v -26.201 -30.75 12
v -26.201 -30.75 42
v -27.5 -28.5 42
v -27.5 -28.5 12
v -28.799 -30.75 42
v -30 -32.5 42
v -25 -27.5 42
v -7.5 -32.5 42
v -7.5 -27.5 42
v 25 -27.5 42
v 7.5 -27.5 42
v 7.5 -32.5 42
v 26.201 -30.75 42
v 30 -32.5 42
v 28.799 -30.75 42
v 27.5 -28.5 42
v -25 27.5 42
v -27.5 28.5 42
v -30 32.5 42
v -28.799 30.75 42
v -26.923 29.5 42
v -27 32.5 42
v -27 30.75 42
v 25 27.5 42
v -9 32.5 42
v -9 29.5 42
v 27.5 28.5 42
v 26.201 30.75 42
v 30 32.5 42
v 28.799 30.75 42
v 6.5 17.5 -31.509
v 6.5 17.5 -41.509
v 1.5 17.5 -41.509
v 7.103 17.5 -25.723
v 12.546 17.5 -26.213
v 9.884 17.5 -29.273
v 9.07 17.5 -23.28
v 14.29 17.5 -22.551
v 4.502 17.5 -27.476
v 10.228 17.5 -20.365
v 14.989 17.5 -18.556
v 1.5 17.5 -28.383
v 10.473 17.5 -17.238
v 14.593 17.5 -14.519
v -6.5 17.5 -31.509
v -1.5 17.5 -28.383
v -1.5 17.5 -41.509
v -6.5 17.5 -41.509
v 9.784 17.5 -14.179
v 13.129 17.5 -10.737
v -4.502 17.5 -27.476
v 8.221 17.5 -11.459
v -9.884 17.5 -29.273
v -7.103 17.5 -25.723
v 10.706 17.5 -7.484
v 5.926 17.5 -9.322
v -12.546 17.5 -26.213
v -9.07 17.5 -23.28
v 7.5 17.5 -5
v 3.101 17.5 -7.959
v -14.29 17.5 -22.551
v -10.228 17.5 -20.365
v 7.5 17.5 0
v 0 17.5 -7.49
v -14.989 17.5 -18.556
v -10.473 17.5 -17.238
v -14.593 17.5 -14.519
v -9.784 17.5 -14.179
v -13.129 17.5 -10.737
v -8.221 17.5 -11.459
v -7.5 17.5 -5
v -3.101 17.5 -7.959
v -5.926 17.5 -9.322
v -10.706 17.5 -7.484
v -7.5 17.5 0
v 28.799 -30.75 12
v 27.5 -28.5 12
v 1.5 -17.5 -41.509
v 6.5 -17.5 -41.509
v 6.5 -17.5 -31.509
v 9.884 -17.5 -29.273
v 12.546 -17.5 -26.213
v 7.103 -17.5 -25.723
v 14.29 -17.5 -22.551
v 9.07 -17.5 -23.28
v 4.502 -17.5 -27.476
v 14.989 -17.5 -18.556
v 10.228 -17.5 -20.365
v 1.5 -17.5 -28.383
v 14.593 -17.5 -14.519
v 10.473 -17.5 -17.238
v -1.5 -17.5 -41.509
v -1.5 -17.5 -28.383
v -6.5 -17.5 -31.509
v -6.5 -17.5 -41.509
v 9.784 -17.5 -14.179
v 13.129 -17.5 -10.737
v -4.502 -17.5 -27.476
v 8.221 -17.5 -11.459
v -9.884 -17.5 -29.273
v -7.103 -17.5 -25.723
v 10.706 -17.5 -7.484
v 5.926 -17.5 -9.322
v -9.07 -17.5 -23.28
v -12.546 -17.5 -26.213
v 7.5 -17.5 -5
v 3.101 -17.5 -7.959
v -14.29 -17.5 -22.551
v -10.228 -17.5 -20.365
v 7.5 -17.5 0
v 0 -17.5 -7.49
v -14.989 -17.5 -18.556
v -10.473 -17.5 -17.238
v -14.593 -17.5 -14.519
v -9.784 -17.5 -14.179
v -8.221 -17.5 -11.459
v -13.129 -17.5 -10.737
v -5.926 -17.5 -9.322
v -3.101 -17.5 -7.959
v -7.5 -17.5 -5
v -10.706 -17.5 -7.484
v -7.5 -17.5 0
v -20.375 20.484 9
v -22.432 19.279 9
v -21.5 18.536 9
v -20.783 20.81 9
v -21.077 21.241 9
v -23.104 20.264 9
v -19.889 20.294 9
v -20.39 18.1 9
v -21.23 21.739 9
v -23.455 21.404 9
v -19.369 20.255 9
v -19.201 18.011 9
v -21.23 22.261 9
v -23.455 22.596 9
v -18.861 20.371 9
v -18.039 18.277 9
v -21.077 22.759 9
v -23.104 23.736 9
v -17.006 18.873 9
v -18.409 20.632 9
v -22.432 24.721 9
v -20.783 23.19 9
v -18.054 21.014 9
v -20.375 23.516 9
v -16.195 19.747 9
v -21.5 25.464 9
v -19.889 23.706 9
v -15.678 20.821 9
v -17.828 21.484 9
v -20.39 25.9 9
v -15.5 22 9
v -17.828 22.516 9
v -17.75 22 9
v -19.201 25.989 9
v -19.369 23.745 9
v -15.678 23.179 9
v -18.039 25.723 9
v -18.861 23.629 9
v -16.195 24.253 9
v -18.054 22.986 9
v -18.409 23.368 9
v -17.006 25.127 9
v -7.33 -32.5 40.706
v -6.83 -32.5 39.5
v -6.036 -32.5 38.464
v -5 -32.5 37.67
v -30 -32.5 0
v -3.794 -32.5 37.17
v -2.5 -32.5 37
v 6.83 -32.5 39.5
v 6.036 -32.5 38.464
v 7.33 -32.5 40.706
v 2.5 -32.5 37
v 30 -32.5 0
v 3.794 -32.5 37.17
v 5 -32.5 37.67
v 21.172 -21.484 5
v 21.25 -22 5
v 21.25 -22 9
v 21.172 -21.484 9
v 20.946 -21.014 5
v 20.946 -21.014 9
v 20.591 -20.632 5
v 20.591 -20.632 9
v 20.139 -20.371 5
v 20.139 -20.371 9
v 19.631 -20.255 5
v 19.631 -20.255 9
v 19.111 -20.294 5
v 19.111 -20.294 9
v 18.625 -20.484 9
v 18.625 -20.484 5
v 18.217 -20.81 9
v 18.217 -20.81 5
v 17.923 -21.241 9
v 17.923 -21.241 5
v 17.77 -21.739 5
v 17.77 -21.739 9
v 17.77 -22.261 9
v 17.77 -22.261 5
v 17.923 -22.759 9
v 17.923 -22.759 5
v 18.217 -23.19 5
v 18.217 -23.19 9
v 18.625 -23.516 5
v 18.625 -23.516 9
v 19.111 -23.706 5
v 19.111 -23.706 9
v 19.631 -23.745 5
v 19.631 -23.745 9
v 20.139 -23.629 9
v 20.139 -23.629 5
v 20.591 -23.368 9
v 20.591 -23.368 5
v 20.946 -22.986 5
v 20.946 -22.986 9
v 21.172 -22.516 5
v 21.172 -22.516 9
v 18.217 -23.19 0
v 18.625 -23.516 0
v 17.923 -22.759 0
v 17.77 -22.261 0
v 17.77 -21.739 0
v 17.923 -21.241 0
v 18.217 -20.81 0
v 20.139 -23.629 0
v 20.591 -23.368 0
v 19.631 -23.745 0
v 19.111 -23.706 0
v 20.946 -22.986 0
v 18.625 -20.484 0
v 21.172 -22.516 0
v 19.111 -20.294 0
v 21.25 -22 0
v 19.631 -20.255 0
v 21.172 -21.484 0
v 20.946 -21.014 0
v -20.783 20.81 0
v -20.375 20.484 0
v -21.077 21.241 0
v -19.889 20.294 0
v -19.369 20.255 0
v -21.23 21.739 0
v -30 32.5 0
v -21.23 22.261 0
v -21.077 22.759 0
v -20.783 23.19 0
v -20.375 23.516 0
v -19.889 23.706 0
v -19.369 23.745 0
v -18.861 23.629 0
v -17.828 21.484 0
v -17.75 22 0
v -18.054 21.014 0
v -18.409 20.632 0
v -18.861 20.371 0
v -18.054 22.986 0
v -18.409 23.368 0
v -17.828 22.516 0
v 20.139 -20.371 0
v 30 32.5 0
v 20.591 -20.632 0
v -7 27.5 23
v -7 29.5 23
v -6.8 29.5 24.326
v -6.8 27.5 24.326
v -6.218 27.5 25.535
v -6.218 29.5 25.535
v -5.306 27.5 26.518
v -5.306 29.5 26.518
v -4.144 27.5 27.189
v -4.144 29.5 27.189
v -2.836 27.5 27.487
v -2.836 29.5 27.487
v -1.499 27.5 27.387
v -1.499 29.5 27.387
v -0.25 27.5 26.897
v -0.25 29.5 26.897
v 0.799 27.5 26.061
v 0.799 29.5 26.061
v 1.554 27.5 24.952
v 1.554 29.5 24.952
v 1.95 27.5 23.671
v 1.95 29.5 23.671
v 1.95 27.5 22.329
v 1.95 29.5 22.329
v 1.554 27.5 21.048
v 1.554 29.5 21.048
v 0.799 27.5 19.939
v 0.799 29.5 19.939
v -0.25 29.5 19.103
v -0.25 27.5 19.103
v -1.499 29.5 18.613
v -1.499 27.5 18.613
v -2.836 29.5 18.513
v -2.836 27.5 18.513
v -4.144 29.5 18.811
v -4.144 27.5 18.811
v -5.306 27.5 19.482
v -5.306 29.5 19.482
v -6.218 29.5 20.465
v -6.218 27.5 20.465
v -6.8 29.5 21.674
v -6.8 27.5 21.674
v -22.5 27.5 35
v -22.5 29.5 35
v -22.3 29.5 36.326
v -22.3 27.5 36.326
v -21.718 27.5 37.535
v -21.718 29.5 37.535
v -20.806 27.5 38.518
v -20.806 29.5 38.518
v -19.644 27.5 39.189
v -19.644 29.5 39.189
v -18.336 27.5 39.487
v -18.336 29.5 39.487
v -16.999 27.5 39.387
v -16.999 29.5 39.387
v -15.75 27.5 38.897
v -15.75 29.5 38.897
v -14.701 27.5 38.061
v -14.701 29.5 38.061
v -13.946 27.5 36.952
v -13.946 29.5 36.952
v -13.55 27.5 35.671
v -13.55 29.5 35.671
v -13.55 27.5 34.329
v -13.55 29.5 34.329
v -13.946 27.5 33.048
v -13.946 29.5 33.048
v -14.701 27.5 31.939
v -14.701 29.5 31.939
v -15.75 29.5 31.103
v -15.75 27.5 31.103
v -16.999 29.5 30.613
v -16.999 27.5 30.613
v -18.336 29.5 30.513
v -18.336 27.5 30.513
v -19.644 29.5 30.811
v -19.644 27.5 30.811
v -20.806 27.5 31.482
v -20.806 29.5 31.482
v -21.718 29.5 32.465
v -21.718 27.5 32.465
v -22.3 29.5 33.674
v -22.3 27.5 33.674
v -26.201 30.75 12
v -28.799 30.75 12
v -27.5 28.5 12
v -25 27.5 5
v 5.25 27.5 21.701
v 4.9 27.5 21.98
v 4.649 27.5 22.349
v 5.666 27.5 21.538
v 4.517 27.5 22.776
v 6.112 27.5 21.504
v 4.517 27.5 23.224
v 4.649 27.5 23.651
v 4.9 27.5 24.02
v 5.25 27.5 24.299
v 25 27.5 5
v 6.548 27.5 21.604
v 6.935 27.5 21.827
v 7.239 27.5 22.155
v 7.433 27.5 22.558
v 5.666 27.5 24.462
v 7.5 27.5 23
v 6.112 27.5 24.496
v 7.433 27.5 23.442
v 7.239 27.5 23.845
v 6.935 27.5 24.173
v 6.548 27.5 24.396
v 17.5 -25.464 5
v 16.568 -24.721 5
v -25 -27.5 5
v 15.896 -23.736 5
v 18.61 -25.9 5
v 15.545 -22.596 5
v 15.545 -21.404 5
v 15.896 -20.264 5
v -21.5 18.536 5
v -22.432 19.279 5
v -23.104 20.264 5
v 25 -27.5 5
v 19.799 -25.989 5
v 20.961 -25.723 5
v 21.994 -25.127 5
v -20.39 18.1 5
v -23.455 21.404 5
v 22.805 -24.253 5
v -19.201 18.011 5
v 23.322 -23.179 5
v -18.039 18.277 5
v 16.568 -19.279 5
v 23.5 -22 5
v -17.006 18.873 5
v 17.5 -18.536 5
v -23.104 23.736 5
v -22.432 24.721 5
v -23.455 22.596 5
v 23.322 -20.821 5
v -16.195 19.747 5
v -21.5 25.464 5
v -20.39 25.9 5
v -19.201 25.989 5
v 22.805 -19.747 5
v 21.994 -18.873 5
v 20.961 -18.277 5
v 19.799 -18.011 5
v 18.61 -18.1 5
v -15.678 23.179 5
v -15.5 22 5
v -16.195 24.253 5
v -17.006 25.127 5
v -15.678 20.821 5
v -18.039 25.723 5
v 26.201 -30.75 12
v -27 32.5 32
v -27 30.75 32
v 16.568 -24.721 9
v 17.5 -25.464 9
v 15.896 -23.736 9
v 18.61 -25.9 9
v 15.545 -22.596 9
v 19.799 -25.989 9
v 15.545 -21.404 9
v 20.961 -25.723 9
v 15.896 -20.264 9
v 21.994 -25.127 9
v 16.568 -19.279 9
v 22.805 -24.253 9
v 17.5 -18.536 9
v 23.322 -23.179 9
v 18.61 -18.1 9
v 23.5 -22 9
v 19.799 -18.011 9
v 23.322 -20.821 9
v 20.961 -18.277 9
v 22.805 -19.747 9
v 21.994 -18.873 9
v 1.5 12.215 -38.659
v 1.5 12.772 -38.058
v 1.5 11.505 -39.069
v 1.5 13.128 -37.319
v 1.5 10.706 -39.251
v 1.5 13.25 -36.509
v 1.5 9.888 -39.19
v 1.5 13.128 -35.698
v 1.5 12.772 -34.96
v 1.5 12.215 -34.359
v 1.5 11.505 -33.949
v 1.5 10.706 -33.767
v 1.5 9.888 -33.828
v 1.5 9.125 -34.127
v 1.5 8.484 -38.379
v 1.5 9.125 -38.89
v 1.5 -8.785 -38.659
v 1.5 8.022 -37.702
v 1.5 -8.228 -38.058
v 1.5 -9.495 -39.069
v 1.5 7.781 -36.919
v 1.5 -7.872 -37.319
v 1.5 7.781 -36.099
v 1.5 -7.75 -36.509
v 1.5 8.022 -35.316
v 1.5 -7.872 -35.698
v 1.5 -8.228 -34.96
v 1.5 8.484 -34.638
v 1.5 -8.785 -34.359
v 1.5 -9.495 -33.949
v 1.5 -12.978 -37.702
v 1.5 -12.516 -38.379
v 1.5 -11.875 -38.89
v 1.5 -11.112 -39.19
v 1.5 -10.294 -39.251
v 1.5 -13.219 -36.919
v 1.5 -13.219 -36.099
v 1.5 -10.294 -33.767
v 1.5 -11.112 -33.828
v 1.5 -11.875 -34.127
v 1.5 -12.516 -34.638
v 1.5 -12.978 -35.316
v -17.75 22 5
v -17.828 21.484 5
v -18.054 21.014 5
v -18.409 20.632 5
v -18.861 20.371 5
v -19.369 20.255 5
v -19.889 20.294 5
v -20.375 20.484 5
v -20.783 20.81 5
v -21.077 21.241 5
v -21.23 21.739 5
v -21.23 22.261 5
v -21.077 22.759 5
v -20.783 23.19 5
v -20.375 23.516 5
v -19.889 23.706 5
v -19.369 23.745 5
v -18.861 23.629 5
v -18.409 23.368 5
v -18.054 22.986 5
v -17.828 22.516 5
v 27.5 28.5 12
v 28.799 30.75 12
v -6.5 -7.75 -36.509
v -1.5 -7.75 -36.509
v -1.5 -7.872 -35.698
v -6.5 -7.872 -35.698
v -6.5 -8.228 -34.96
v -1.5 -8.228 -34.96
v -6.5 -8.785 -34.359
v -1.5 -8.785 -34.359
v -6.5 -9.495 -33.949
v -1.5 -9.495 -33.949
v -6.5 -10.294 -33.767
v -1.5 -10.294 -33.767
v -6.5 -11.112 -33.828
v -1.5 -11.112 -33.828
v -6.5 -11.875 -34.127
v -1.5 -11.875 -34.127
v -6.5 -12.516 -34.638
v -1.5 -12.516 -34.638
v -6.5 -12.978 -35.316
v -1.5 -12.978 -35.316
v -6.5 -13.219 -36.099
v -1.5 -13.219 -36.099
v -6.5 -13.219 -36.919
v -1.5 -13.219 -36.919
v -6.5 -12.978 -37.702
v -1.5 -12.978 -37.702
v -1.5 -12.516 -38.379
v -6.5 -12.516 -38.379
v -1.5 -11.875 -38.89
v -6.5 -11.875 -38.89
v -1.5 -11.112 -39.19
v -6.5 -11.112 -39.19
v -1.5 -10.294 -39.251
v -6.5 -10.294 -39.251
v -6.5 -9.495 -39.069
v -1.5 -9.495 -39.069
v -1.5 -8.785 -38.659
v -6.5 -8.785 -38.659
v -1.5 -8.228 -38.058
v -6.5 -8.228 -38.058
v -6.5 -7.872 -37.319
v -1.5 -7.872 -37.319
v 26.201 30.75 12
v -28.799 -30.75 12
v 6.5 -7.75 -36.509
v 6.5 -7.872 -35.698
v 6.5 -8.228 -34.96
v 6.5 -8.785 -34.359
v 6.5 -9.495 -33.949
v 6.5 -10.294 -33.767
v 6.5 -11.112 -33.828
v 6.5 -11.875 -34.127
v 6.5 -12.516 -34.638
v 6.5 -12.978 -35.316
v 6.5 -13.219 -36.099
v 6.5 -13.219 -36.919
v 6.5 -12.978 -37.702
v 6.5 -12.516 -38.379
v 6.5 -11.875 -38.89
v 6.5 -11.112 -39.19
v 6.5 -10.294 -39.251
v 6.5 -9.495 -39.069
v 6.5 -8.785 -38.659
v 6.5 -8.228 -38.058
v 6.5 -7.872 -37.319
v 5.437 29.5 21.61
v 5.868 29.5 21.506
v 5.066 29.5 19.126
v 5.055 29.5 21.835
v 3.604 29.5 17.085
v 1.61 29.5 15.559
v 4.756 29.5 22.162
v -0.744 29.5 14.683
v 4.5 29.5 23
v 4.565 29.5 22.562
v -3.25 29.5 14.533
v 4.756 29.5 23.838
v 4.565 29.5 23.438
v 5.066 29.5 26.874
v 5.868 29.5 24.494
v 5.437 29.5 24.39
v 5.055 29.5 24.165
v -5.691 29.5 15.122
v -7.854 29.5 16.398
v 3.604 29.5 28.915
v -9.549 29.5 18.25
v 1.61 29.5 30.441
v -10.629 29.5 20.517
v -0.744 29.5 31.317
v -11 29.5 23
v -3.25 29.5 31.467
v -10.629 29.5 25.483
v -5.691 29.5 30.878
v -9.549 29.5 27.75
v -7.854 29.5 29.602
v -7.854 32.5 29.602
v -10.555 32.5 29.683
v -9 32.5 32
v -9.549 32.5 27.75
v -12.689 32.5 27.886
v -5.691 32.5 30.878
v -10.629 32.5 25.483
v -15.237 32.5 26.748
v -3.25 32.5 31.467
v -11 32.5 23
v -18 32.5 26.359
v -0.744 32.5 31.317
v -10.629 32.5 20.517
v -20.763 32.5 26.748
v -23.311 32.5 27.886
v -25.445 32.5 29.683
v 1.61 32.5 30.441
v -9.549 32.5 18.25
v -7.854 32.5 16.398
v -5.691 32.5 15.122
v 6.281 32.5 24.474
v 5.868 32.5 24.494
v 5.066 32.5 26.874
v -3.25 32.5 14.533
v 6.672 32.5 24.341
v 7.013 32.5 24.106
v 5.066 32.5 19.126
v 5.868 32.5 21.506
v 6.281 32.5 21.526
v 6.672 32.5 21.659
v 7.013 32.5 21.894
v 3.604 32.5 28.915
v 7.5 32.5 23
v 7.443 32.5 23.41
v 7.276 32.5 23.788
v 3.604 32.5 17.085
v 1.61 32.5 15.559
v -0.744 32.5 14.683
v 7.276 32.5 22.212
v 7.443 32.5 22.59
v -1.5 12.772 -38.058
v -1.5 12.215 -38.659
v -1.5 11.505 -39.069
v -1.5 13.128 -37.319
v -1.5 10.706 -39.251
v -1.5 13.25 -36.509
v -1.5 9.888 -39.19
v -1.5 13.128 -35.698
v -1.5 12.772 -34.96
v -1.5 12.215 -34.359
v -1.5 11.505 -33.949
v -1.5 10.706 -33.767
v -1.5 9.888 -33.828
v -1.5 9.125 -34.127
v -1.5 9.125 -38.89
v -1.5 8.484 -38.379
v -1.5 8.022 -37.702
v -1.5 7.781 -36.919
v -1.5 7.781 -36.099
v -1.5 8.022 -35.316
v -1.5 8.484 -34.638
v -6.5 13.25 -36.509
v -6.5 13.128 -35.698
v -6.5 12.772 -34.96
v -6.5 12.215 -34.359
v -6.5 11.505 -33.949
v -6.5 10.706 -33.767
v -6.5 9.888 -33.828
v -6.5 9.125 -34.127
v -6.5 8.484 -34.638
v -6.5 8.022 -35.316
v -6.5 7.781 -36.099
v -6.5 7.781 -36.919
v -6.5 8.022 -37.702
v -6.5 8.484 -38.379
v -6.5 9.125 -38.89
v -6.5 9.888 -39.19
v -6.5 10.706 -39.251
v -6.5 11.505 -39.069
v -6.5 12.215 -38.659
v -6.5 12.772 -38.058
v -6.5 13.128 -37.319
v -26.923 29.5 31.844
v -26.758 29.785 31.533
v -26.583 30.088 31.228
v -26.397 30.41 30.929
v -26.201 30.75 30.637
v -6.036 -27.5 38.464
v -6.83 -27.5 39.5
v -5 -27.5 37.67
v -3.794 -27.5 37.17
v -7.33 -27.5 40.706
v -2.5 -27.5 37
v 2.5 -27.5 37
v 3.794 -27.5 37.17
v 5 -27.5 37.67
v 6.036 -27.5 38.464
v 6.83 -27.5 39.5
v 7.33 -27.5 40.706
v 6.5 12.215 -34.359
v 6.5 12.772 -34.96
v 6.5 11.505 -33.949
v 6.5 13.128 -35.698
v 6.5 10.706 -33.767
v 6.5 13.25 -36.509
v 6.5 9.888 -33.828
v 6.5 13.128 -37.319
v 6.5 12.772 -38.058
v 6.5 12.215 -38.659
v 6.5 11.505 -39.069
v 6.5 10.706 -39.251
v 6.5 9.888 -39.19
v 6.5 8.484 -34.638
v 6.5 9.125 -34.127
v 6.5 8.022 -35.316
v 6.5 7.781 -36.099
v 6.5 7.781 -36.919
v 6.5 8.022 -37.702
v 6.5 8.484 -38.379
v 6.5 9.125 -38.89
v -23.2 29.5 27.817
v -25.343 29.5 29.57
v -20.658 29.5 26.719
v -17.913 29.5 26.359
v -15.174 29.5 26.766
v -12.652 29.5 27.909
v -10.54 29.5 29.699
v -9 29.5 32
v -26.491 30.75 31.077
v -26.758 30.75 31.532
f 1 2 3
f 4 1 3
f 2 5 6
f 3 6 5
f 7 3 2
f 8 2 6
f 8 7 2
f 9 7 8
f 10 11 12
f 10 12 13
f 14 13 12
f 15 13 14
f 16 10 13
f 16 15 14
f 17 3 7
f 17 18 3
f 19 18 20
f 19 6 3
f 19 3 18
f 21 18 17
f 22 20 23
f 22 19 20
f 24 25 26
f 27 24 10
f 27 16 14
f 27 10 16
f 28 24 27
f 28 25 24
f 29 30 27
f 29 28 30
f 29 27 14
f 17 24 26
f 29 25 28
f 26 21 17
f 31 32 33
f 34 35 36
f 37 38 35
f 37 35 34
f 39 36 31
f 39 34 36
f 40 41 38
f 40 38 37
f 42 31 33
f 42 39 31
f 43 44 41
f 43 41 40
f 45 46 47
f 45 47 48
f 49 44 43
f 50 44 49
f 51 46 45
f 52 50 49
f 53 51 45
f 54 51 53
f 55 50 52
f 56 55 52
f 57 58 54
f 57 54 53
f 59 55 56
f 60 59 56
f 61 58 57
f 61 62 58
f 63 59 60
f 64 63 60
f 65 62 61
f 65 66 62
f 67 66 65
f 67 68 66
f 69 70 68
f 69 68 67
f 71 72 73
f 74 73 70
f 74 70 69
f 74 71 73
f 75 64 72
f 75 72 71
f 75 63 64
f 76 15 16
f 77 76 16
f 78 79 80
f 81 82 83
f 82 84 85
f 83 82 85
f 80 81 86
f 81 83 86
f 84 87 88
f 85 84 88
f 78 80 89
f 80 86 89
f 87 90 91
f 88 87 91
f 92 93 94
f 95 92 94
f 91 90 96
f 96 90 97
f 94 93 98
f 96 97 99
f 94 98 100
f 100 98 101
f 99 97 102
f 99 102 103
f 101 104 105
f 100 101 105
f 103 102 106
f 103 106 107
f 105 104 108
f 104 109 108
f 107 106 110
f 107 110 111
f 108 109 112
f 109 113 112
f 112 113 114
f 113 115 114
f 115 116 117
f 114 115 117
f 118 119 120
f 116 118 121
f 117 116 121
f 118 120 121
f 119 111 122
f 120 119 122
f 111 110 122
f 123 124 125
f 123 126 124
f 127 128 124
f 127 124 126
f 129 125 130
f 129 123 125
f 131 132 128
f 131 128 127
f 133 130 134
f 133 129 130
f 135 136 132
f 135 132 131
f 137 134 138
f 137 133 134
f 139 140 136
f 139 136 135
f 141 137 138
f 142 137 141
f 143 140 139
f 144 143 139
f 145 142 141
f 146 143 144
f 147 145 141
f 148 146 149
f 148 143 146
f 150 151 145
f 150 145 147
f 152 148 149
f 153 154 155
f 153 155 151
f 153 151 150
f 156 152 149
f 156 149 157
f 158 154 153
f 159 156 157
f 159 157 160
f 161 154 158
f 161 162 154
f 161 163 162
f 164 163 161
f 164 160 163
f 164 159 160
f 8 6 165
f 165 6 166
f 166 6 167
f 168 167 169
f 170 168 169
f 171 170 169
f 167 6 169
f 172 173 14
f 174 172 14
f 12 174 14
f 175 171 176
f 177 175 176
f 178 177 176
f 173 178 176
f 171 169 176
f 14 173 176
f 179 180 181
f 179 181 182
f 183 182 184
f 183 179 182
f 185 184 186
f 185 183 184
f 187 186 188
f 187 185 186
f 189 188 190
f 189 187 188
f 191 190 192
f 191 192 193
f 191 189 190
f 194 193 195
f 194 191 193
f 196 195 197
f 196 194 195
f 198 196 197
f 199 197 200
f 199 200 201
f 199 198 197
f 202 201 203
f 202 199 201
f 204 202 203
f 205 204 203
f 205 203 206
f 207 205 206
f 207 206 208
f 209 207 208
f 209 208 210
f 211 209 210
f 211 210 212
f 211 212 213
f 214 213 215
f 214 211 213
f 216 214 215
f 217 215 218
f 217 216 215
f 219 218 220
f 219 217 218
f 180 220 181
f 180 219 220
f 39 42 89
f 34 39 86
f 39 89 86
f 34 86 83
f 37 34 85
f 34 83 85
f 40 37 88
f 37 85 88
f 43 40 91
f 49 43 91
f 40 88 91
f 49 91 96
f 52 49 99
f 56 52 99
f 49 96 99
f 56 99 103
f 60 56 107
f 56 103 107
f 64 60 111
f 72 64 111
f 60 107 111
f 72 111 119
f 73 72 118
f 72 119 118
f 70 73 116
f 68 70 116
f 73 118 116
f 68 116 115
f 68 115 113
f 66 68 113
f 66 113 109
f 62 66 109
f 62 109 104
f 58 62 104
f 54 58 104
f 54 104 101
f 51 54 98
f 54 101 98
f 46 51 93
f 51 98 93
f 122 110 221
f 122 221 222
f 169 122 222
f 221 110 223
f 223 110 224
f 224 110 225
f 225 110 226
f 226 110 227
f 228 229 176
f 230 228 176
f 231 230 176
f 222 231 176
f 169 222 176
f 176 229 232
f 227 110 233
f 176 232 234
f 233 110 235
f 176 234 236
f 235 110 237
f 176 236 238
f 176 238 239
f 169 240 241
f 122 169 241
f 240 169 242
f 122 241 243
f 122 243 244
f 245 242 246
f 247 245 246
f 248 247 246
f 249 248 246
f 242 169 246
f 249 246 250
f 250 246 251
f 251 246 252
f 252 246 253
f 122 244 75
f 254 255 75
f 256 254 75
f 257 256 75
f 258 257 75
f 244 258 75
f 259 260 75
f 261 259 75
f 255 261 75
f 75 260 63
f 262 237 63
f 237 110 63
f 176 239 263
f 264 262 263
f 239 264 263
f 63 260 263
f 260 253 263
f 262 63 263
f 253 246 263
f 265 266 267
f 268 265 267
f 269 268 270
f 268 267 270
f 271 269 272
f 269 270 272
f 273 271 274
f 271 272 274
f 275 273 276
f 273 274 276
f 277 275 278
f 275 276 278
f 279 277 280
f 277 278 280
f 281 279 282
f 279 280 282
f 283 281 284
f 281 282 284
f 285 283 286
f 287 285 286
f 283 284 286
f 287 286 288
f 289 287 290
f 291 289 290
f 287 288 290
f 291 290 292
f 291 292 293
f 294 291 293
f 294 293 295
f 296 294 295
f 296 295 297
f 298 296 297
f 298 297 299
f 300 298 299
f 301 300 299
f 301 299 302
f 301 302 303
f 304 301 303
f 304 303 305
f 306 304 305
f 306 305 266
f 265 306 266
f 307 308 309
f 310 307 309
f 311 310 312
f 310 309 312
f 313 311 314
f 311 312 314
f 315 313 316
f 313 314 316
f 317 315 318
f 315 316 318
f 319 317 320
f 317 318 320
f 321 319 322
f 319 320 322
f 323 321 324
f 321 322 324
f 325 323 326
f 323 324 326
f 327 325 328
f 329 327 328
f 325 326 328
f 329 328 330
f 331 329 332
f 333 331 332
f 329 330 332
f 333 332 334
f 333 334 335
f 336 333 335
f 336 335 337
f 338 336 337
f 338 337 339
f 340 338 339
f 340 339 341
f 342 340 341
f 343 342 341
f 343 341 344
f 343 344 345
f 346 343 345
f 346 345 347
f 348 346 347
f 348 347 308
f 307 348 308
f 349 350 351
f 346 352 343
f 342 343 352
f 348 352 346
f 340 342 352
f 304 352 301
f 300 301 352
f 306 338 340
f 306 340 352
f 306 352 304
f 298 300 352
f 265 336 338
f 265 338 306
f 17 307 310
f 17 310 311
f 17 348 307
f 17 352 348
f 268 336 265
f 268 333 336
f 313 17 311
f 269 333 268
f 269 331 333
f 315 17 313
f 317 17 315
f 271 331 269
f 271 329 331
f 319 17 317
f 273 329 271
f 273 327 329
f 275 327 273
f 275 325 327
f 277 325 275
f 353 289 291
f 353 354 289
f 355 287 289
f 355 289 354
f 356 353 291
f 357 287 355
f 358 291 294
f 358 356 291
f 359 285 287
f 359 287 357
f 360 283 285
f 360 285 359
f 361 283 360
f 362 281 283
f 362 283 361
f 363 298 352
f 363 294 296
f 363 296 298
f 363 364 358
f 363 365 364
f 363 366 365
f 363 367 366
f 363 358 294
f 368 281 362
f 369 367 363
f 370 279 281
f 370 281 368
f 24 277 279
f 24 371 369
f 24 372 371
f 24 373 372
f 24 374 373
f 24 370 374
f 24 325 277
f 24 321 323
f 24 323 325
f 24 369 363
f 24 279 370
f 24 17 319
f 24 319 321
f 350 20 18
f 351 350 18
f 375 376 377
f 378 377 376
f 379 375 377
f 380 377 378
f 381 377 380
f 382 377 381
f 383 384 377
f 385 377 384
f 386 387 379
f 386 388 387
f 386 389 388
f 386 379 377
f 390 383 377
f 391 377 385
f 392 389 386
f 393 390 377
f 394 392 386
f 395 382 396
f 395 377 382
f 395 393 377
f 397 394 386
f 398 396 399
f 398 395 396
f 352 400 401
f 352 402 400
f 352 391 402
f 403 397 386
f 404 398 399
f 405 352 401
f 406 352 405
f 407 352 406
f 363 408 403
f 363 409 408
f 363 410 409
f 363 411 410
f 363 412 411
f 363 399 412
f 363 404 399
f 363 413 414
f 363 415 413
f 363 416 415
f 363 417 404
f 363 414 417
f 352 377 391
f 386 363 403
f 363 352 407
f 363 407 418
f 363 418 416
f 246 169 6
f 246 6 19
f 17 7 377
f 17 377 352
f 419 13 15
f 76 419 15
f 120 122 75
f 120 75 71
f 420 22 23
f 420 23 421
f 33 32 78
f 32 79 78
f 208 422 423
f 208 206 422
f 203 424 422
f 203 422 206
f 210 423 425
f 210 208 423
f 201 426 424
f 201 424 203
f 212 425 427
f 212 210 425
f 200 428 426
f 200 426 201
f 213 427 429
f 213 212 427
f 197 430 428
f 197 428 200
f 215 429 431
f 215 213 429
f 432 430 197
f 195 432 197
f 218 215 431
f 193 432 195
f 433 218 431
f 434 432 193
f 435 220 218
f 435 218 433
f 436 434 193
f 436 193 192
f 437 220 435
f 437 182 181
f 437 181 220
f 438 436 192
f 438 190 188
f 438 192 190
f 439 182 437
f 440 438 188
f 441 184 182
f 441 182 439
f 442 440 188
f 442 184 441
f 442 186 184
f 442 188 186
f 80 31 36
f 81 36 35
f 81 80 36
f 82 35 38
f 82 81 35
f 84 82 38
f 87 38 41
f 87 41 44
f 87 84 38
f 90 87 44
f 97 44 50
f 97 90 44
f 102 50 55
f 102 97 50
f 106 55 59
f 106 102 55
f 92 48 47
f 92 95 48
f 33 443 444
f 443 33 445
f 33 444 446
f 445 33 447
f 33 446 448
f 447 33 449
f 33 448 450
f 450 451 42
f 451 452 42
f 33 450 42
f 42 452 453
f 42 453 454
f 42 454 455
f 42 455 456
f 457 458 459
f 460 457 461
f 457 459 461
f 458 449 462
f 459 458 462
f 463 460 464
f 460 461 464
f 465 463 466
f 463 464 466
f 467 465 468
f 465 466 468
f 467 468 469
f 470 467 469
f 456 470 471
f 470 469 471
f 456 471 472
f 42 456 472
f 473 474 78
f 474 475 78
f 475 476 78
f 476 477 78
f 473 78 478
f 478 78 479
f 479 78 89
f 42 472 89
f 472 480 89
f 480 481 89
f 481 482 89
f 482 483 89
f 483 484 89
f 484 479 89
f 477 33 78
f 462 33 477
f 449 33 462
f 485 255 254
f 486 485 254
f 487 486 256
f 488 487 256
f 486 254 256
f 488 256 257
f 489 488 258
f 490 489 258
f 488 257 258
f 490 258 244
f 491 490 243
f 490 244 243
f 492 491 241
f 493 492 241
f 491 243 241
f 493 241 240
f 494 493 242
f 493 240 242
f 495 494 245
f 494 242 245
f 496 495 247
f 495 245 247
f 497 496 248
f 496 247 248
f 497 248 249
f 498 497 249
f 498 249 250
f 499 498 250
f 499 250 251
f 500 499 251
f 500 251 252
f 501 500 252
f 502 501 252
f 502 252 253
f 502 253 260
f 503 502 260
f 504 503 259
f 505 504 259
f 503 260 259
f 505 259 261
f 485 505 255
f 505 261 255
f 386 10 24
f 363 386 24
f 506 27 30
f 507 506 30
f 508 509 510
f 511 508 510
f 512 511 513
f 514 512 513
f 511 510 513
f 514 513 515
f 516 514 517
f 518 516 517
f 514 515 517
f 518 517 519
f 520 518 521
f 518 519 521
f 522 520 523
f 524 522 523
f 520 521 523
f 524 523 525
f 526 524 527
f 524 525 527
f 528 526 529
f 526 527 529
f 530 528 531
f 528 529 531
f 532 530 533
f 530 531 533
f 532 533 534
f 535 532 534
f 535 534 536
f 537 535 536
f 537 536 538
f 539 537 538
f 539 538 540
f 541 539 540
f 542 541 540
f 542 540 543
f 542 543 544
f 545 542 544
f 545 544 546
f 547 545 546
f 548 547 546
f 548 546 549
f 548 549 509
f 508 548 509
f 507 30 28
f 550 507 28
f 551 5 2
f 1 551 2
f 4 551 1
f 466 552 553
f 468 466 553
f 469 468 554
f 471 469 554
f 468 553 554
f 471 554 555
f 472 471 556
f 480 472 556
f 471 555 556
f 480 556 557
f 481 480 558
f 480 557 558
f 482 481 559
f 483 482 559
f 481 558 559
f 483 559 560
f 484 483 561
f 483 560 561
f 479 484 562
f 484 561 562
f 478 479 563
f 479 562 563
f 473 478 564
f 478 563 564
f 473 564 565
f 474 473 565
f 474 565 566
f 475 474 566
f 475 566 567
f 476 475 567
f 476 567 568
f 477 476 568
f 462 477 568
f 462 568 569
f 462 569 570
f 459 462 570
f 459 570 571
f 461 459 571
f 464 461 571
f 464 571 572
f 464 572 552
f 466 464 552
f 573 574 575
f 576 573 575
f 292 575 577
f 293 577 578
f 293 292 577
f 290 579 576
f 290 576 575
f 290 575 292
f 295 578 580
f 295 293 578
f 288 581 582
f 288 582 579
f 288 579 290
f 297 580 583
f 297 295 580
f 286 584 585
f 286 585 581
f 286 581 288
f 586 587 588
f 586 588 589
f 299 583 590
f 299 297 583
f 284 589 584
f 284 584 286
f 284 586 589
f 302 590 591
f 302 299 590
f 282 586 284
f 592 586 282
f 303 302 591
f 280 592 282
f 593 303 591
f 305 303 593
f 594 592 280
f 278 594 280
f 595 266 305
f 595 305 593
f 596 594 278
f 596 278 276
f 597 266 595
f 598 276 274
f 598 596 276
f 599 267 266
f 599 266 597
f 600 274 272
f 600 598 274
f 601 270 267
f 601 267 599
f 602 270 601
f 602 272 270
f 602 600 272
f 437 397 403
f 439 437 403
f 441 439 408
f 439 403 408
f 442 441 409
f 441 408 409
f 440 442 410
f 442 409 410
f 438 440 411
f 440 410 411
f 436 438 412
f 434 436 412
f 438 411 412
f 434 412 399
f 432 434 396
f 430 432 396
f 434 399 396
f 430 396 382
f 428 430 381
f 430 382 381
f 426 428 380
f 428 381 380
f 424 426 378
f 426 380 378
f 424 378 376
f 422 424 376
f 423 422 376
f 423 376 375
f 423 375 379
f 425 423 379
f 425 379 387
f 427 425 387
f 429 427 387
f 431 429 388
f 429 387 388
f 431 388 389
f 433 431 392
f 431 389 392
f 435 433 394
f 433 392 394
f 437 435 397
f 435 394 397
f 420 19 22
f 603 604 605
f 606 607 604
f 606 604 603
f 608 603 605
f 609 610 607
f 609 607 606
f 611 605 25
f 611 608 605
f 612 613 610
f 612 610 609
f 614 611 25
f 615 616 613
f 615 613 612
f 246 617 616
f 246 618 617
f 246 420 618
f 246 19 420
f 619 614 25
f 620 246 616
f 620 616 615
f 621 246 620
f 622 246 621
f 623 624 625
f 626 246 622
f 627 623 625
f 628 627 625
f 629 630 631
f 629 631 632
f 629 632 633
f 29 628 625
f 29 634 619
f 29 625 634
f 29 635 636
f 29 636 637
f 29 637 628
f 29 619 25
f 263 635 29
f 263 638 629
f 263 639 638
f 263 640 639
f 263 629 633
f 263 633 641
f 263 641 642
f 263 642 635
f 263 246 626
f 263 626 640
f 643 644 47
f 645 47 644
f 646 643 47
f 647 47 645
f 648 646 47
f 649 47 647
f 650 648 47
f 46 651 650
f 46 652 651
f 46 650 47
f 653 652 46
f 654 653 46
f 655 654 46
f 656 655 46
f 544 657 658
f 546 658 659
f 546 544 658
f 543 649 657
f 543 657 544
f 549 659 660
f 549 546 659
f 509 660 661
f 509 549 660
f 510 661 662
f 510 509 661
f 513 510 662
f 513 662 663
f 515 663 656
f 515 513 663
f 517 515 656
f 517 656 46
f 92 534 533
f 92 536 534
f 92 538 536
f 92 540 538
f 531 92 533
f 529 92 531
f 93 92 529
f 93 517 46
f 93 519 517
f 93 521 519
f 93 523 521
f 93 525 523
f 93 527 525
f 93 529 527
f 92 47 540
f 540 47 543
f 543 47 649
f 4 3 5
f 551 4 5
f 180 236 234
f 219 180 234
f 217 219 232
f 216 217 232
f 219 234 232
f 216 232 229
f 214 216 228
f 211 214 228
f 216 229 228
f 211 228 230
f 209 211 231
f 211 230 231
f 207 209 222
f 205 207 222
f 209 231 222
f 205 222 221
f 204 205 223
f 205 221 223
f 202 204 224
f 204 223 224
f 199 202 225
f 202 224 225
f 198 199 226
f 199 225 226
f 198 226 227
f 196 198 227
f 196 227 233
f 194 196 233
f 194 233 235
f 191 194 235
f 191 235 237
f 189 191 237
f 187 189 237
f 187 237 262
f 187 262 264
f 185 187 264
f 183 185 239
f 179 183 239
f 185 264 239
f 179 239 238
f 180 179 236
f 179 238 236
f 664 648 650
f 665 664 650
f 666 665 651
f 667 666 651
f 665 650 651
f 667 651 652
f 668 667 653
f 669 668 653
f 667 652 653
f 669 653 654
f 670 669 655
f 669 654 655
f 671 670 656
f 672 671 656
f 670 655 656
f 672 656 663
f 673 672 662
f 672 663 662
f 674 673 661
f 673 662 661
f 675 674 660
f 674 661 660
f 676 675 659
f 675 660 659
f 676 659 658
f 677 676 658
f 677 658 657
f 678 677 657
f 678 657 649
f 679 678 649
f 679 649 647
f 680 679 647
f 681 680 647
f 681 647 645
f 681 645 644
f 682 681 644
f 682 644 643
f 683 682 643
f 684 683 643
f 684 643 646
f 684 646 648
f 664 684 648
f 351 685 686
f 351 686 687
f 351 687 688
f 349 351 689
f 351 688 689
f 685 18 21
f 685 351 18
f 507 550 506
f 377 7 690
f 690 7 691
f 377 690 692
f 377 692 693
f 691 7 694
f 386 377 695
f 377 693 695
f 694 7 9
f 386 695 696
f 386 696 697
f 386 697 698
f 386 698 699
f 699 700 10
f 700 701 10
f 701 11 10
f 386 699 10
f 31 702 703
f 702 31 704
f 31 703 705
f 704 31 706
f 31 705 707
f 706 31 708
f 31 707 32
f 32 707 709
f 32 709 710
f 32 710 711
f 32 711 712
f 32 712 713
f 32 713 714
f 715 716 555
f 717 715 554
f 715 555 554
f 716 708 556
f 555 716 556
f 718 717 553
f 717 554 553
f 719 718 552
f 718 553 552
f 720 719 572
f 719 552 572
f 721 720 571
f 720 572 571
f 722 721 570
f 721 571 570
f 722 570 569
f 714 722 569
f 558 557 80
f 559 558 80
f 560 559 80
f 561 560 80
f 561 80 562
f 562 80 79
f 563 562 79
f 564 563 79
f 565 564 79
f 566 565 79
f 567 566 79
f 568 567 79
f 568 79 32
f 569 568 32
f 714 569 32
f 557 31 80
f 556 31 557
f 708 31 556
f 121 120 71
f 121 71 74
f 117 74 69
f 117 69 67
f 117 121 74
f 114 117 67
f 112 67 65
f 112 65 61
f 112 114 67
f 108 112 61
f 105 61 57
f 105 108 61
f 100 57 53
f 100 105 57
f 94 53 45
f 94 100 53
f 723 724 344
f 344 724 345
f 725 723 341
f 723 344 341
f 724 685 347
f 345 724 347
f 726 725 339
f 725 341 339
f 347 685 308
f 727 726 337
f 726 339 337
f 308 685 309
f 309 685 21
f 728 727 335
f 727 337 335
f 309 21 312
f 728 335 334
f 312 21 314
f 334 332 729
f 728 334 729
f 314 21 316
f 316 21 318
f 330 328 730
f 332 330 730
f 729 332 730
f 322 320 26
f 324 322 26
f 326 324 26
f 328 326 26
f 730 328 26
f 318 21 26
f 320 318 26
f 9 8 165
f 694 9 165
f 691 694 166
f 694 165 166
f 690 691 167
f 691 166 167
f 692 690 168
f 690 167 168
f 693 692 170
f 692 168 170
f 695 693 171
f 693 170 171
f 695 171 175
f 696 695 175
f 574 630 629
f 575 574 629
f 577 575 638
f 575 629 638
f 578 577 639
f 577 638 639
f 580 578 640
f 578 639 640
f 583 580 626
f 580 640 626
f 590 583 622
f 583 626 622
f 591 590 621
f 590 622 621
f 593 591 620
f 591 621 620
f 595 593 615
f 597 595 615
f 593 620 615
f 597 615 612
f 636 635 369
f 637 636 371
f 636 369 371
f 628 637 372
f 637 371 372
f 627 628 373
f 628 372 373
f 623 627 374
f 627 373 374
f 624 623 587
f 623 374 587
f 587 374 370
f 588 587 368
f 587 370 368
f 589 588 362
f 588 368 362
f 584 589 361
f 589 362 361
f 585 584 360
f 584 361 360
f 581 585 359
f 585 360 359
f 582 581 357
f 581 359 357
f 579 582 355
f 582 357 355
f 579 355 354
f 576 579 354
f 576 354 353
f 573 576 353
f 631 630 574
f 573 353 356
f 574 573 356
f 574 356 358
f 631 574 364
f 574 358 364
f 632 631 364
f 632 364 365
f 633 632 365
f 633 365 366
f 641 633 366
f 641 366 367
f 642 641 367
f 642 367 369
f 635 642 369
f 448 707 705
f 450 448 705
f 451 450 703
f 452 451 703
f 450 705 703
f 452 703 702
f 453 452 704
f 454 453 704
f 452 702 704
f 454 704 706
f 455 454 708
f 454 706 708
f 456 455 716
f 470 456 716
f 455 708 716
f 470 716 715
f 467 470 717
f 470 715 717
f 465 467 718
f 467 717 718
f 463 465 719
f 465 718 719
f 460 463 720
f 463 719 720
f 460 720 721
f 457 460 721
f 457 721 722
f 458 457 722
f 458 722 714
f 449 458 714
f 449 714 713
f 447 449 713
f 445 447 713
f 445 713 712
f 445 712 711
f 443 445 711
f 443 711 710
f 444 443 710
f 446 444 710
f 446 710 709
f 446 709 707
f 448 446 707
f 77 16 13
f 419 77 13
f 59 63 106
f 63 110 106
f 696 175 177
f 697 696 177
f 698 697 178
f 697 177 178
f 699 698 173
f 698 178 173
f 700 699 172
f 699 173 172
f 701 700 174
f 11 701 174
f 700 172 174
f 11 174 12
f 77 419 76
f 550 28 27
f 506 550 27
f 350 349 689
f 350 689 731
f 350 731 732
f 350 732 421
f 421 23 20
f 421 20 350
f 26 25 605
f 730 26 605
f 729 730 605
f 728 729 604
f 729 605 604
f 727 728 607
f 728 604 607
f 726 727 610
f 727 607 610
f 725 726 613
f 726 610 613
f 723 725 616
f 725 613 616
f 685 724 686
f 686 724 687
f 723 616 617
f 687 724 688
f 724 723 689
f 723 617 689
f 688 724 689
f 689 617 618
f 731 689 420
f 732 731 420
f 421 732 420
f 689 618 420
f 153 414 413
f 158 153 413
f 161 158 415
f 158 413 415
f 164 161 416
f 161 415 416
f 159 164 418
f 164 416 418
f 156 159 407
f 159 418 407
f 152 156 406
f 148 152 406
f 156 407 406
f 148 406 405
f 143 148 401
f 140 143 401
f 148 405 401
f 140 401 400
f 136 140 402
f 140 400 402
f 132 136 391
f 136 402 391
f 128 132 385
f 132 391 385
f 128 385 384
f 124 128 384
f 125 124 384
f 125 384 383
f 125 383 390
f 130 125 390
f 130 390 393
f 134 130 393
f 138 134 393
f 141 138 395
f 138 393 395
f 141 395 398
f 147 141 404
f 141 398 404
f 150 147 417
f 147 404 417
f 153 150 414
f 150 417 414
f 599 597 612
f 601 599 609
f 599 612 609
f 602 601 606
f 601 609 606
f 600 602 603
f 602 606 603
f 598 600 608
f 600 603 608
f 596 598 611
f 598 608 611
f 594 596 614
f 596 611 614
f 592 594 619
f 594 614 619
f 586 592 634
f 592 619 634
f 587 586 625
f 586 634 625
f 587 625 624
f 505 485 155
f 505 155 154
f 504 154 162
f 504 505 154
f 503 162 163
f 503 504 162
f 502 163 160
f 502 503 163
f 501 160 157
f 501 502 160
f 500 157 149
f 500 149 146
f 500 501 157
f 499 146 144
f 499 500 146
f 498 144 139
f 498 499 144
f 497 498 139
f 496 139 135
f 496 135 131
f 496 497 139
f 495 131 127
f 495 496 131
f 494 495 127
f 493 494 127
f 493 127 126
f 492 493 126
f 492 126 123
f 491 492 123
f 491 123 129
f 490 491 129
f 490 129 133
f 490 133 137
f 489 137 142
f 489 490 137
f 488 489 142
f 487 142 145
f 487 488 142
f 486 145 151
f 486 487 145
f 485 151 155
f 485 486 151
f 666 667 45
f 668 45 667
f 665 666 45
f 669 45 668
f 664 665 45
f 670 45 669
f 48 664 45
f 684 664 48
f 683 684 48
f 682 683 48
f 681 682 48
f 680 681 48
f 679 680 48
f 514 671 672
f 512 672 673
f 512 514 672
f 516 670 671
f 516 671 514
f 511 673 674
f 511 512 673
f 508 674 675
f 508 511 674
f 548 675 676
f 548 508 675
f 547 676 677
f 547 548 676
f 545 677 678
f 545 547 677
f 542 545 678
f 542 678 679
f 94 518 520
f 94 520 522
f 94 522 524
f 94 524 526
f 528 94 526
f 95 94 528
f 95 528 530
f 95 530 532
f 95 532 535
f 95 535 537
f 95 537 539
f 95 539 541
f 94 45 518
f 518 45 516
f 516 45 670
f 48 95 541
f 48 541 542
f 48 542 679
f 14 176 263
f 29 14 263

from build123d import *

# Parameters (mm, degrees)
SKETCH_W        = 60
SKETCH_H        = 65
PAD_DEPTH       = 42
SKETCH001_W     = 50
SKETCH001_H     = 55
POCKET_DEPTH    = 37
SKETCH002_R     = 1.75
POCKET001_DEPTH = 5
SKETCH003_R     = 4
SKETCH003_R_2   = 1.75
PAD001_DEPTH    = 4
SKETCH004_R     = 4.5
POCKET002_DEPTH = 5
SKETCH005_R     = 8.5
POCKET003_DEPTH = 3
POCKET004_DEPTH = 30
POCKET005_DEPTH = 5
PAD002_DEPTH    = 17.5
SKETCH009_R     = 2.75
POCKET006_DEPTH = 36.501
SKETCH010_R     = 4.5
POCKET007_DEPTH = 5
POCKET008_DEPTH = 3
SKETCH012_R     = 1.5
POCKET009_DEPTH = 5


with BuildPart() as part:
    # Sketch → Pad (new body)
    with BuildSketch(Plane.XY):
        Rectangle(SKETCH_W, SKETCH_H)
    extrude(amount=PAD_DEPTH)

    # Sketch001 (on Face6 of Pad) → Pocket (cut)
    with BuildSketch(Plane.XY.offset(42)):
        Rectangle(SKETCH001_W, SKETCH001_H)
    extrude(amount=-POCKET_DEPTH, mode=Mode.SUBTRACT)

    # Sketch002 (on Face4 of Pocket) → Pocket001 (cut)
    with BuildSketch(Plane(origin=(0, 0, 0), x_dir=(1, 0, 0), z_dir=(0, 0, -1))):
        with Locations((-19.5, -22)):
            Circle(SKETCH002_R)
        with Locations((19.5, 22)):
            Circle(SKETCH002_R)
    extrude(amount=-POCKET001_DEPTH, mode=Mode.SUBTRACT)

    # Sketch003 (on Face13 of Pocket001) → Pad001 (join)
    with BuildSketch(Plane.XY.offset(5)):
        with Locations((-19.5, 22)):
            Circle(SKETCH003_R)
        with Locations((-19.5, 22)):
            Circle(SKETCH003_R_2, mode=Mode.SUBTRACT)
        with Locations((19.5, -22)):
            Circle(SKETCH003_R)
        with Locations((19.5, -22)):
            Circle(SKETCH003_R_2, mode=Mode.SUBTRACT)
    extrude(amount=PAD001_DEPTH)

    # Sketch004 (on Face1 of Pad001) → Pocket002 (cut)
    with BuildSketch(Plane(origin=(0, 32.5, 0), x_dir=(-1, 0, 0), z_dir=(0, 1, 0))):
        with Locations((2.5, 23)):
            Circle(SKETCH004_R)
    extrude(amount=-POCKET002_DEPTH, mode=Mode.SUBTRACT)

    # Sketch005 (on Face1 of Pocket002) → Pocket003 (cut)
    with BuildSketch(Plane(origin=(0, 32.5, 0), x_dir=(-1, 0, 0), z_dir=(0, 1, 0))):
        with Locations((2.5, 23)):
            Circle(SKETCH005_R)
    extrude(amount=-POCKET003_DEPTH, mode=Mode.SUBTRACT)

    # Sketch006 (on Face4 of Pocket003) → Pocket004 (cut)
    with BuildSketch(Plane.XY.offset(42)):
        Polygon((-27.5, 28.5), (-26.200962, 30.75), (-28.799038, 30.75), align=None)
        Polygon((27.5, 28.5), (28.799038, 30.75), (26.200962, 30.75), align=None)
        Polygon((28.799038, -30.75), (27.5, -28.5), (26.200962, -30.75), align=None)
        Polygon((-26.200962, -30.75), (-27.5, -28.5), (-28.799038, -30.75), align=None)
    extrude(amount=-POCKET004_DEPTH, mode=Mode.SUBTRACT)

    # Sketch007 (on Face7 of Pocket004) → Pocket005 (cut)
    with BuildSketch(Plane.XZ.offset(32.5)):
        with BuildLine():
            Line((-7.5, 42), (7.5, 42))
            ThreePointArc((2.5, 37), (6.035534, 38.464466), (7.5, 42))
            Line((-2.5, 37), (2.5, 37))
            ThreePointArc((-7.5, 42), (-6.035534, 38.464466), (-2.5, 37))
        make_face()
    extrude(amount=-POCKET005_DEPTH, mode=Mode.SUBTRACT)

    # Sketch008 (on DatumPlane) → Pad002 (join, symmetric)
    with BuildSketch(Plane.XZ):
        with BuildLine():
            Line((-7.5, 0), (7.5, 0))
            Line((7.5, 0), (7.5, -5))
            ThreePointArc((6.5, -31.508887), (14.989339, -18.555827), (7.5, -5))
            Line((6.5, -31.508887), (6.5, -41.508887))
            Line((6.5, -41.508887), (1.5, -41.508887))
            Line((1.5, -41.508887), (1.5, -28.382686))
            ThreePointArc((1.5, -28.382686), (0, -7.490381), (-1.5, -28.382686))
            Line((-1.5, -41.508887), (-1.5, -28.382686))
            Line((-6.5, -41.508887), (-1.5, -41.508887))
            Line((-6.5, -31.508887), (-6.5, -41.508887))
            ThreePointArc((-7.5, -5), (-14.989339, -18.555827), (-6.5, -31.508887))
            Line((-7.5, 0), (-7.5, -5))
        make_face()
    extrude(amount=PAD002_DEPTH, both=True)

    # Sketch009 (on Face36 of Pad002) → Pocket006 (cut, through all)
    with BuildSketch(Plane.YZ.offset(6.5)):
        with Locations((-10.5, -36.508887)):
            Circle(SKETCH009_R)
        with Locations((10.5, -36.508887)):
            Circle(SKETCH009_R)
    extrude(amount=-POCKET006_DEPTH, mode=Mode.SUBTRACT)

    # Sketch010 (on Face1 of Pocket006) → Pocket007 (cut)
    with BuildSketch(Plane(origin=(0, 32.5, 0), x_dir=(-1, 0, 0), z_dir=(0, 1, 0))):
        with Locations((18, 35)):
            Circle(SKETCH010_R)
    extrude(amount=-POCKET007_DEPTH, mode=Mode.SUBTRACT)

    # Sketch011 (on Face1 of Pocket007) → Pocket008 (cut)
    with BuildSketch(Plane(origin=(0, 32.5, 0), x_dir=(-1, 0, 0), z_dir=(0, 1, 0))):
        with BuildLine():
            Line((9, 42), (27, 42))
            Line((27, 42), (27, 32))
            ThreePointArc((9, 32), (18, 26.358899), (27, 32))
            Line((9, 42), (9, 32))
        make_face()
    extrude(amount=-POCKET008_DEPTH, mode=Mode.SUBTRACT)

    # Sketch012 (on Face20 of Pocket008) → Pocket009 (cut)
    with BuildSketch(Plane.XZ.offset(-27.5)):
        with Locations((6, 23)):
            Circle(SKETCH012_R)
    extrude(amount=-POCKET009_DEPTH, mode=Mode.SUBTRACT)


solid = part.part
